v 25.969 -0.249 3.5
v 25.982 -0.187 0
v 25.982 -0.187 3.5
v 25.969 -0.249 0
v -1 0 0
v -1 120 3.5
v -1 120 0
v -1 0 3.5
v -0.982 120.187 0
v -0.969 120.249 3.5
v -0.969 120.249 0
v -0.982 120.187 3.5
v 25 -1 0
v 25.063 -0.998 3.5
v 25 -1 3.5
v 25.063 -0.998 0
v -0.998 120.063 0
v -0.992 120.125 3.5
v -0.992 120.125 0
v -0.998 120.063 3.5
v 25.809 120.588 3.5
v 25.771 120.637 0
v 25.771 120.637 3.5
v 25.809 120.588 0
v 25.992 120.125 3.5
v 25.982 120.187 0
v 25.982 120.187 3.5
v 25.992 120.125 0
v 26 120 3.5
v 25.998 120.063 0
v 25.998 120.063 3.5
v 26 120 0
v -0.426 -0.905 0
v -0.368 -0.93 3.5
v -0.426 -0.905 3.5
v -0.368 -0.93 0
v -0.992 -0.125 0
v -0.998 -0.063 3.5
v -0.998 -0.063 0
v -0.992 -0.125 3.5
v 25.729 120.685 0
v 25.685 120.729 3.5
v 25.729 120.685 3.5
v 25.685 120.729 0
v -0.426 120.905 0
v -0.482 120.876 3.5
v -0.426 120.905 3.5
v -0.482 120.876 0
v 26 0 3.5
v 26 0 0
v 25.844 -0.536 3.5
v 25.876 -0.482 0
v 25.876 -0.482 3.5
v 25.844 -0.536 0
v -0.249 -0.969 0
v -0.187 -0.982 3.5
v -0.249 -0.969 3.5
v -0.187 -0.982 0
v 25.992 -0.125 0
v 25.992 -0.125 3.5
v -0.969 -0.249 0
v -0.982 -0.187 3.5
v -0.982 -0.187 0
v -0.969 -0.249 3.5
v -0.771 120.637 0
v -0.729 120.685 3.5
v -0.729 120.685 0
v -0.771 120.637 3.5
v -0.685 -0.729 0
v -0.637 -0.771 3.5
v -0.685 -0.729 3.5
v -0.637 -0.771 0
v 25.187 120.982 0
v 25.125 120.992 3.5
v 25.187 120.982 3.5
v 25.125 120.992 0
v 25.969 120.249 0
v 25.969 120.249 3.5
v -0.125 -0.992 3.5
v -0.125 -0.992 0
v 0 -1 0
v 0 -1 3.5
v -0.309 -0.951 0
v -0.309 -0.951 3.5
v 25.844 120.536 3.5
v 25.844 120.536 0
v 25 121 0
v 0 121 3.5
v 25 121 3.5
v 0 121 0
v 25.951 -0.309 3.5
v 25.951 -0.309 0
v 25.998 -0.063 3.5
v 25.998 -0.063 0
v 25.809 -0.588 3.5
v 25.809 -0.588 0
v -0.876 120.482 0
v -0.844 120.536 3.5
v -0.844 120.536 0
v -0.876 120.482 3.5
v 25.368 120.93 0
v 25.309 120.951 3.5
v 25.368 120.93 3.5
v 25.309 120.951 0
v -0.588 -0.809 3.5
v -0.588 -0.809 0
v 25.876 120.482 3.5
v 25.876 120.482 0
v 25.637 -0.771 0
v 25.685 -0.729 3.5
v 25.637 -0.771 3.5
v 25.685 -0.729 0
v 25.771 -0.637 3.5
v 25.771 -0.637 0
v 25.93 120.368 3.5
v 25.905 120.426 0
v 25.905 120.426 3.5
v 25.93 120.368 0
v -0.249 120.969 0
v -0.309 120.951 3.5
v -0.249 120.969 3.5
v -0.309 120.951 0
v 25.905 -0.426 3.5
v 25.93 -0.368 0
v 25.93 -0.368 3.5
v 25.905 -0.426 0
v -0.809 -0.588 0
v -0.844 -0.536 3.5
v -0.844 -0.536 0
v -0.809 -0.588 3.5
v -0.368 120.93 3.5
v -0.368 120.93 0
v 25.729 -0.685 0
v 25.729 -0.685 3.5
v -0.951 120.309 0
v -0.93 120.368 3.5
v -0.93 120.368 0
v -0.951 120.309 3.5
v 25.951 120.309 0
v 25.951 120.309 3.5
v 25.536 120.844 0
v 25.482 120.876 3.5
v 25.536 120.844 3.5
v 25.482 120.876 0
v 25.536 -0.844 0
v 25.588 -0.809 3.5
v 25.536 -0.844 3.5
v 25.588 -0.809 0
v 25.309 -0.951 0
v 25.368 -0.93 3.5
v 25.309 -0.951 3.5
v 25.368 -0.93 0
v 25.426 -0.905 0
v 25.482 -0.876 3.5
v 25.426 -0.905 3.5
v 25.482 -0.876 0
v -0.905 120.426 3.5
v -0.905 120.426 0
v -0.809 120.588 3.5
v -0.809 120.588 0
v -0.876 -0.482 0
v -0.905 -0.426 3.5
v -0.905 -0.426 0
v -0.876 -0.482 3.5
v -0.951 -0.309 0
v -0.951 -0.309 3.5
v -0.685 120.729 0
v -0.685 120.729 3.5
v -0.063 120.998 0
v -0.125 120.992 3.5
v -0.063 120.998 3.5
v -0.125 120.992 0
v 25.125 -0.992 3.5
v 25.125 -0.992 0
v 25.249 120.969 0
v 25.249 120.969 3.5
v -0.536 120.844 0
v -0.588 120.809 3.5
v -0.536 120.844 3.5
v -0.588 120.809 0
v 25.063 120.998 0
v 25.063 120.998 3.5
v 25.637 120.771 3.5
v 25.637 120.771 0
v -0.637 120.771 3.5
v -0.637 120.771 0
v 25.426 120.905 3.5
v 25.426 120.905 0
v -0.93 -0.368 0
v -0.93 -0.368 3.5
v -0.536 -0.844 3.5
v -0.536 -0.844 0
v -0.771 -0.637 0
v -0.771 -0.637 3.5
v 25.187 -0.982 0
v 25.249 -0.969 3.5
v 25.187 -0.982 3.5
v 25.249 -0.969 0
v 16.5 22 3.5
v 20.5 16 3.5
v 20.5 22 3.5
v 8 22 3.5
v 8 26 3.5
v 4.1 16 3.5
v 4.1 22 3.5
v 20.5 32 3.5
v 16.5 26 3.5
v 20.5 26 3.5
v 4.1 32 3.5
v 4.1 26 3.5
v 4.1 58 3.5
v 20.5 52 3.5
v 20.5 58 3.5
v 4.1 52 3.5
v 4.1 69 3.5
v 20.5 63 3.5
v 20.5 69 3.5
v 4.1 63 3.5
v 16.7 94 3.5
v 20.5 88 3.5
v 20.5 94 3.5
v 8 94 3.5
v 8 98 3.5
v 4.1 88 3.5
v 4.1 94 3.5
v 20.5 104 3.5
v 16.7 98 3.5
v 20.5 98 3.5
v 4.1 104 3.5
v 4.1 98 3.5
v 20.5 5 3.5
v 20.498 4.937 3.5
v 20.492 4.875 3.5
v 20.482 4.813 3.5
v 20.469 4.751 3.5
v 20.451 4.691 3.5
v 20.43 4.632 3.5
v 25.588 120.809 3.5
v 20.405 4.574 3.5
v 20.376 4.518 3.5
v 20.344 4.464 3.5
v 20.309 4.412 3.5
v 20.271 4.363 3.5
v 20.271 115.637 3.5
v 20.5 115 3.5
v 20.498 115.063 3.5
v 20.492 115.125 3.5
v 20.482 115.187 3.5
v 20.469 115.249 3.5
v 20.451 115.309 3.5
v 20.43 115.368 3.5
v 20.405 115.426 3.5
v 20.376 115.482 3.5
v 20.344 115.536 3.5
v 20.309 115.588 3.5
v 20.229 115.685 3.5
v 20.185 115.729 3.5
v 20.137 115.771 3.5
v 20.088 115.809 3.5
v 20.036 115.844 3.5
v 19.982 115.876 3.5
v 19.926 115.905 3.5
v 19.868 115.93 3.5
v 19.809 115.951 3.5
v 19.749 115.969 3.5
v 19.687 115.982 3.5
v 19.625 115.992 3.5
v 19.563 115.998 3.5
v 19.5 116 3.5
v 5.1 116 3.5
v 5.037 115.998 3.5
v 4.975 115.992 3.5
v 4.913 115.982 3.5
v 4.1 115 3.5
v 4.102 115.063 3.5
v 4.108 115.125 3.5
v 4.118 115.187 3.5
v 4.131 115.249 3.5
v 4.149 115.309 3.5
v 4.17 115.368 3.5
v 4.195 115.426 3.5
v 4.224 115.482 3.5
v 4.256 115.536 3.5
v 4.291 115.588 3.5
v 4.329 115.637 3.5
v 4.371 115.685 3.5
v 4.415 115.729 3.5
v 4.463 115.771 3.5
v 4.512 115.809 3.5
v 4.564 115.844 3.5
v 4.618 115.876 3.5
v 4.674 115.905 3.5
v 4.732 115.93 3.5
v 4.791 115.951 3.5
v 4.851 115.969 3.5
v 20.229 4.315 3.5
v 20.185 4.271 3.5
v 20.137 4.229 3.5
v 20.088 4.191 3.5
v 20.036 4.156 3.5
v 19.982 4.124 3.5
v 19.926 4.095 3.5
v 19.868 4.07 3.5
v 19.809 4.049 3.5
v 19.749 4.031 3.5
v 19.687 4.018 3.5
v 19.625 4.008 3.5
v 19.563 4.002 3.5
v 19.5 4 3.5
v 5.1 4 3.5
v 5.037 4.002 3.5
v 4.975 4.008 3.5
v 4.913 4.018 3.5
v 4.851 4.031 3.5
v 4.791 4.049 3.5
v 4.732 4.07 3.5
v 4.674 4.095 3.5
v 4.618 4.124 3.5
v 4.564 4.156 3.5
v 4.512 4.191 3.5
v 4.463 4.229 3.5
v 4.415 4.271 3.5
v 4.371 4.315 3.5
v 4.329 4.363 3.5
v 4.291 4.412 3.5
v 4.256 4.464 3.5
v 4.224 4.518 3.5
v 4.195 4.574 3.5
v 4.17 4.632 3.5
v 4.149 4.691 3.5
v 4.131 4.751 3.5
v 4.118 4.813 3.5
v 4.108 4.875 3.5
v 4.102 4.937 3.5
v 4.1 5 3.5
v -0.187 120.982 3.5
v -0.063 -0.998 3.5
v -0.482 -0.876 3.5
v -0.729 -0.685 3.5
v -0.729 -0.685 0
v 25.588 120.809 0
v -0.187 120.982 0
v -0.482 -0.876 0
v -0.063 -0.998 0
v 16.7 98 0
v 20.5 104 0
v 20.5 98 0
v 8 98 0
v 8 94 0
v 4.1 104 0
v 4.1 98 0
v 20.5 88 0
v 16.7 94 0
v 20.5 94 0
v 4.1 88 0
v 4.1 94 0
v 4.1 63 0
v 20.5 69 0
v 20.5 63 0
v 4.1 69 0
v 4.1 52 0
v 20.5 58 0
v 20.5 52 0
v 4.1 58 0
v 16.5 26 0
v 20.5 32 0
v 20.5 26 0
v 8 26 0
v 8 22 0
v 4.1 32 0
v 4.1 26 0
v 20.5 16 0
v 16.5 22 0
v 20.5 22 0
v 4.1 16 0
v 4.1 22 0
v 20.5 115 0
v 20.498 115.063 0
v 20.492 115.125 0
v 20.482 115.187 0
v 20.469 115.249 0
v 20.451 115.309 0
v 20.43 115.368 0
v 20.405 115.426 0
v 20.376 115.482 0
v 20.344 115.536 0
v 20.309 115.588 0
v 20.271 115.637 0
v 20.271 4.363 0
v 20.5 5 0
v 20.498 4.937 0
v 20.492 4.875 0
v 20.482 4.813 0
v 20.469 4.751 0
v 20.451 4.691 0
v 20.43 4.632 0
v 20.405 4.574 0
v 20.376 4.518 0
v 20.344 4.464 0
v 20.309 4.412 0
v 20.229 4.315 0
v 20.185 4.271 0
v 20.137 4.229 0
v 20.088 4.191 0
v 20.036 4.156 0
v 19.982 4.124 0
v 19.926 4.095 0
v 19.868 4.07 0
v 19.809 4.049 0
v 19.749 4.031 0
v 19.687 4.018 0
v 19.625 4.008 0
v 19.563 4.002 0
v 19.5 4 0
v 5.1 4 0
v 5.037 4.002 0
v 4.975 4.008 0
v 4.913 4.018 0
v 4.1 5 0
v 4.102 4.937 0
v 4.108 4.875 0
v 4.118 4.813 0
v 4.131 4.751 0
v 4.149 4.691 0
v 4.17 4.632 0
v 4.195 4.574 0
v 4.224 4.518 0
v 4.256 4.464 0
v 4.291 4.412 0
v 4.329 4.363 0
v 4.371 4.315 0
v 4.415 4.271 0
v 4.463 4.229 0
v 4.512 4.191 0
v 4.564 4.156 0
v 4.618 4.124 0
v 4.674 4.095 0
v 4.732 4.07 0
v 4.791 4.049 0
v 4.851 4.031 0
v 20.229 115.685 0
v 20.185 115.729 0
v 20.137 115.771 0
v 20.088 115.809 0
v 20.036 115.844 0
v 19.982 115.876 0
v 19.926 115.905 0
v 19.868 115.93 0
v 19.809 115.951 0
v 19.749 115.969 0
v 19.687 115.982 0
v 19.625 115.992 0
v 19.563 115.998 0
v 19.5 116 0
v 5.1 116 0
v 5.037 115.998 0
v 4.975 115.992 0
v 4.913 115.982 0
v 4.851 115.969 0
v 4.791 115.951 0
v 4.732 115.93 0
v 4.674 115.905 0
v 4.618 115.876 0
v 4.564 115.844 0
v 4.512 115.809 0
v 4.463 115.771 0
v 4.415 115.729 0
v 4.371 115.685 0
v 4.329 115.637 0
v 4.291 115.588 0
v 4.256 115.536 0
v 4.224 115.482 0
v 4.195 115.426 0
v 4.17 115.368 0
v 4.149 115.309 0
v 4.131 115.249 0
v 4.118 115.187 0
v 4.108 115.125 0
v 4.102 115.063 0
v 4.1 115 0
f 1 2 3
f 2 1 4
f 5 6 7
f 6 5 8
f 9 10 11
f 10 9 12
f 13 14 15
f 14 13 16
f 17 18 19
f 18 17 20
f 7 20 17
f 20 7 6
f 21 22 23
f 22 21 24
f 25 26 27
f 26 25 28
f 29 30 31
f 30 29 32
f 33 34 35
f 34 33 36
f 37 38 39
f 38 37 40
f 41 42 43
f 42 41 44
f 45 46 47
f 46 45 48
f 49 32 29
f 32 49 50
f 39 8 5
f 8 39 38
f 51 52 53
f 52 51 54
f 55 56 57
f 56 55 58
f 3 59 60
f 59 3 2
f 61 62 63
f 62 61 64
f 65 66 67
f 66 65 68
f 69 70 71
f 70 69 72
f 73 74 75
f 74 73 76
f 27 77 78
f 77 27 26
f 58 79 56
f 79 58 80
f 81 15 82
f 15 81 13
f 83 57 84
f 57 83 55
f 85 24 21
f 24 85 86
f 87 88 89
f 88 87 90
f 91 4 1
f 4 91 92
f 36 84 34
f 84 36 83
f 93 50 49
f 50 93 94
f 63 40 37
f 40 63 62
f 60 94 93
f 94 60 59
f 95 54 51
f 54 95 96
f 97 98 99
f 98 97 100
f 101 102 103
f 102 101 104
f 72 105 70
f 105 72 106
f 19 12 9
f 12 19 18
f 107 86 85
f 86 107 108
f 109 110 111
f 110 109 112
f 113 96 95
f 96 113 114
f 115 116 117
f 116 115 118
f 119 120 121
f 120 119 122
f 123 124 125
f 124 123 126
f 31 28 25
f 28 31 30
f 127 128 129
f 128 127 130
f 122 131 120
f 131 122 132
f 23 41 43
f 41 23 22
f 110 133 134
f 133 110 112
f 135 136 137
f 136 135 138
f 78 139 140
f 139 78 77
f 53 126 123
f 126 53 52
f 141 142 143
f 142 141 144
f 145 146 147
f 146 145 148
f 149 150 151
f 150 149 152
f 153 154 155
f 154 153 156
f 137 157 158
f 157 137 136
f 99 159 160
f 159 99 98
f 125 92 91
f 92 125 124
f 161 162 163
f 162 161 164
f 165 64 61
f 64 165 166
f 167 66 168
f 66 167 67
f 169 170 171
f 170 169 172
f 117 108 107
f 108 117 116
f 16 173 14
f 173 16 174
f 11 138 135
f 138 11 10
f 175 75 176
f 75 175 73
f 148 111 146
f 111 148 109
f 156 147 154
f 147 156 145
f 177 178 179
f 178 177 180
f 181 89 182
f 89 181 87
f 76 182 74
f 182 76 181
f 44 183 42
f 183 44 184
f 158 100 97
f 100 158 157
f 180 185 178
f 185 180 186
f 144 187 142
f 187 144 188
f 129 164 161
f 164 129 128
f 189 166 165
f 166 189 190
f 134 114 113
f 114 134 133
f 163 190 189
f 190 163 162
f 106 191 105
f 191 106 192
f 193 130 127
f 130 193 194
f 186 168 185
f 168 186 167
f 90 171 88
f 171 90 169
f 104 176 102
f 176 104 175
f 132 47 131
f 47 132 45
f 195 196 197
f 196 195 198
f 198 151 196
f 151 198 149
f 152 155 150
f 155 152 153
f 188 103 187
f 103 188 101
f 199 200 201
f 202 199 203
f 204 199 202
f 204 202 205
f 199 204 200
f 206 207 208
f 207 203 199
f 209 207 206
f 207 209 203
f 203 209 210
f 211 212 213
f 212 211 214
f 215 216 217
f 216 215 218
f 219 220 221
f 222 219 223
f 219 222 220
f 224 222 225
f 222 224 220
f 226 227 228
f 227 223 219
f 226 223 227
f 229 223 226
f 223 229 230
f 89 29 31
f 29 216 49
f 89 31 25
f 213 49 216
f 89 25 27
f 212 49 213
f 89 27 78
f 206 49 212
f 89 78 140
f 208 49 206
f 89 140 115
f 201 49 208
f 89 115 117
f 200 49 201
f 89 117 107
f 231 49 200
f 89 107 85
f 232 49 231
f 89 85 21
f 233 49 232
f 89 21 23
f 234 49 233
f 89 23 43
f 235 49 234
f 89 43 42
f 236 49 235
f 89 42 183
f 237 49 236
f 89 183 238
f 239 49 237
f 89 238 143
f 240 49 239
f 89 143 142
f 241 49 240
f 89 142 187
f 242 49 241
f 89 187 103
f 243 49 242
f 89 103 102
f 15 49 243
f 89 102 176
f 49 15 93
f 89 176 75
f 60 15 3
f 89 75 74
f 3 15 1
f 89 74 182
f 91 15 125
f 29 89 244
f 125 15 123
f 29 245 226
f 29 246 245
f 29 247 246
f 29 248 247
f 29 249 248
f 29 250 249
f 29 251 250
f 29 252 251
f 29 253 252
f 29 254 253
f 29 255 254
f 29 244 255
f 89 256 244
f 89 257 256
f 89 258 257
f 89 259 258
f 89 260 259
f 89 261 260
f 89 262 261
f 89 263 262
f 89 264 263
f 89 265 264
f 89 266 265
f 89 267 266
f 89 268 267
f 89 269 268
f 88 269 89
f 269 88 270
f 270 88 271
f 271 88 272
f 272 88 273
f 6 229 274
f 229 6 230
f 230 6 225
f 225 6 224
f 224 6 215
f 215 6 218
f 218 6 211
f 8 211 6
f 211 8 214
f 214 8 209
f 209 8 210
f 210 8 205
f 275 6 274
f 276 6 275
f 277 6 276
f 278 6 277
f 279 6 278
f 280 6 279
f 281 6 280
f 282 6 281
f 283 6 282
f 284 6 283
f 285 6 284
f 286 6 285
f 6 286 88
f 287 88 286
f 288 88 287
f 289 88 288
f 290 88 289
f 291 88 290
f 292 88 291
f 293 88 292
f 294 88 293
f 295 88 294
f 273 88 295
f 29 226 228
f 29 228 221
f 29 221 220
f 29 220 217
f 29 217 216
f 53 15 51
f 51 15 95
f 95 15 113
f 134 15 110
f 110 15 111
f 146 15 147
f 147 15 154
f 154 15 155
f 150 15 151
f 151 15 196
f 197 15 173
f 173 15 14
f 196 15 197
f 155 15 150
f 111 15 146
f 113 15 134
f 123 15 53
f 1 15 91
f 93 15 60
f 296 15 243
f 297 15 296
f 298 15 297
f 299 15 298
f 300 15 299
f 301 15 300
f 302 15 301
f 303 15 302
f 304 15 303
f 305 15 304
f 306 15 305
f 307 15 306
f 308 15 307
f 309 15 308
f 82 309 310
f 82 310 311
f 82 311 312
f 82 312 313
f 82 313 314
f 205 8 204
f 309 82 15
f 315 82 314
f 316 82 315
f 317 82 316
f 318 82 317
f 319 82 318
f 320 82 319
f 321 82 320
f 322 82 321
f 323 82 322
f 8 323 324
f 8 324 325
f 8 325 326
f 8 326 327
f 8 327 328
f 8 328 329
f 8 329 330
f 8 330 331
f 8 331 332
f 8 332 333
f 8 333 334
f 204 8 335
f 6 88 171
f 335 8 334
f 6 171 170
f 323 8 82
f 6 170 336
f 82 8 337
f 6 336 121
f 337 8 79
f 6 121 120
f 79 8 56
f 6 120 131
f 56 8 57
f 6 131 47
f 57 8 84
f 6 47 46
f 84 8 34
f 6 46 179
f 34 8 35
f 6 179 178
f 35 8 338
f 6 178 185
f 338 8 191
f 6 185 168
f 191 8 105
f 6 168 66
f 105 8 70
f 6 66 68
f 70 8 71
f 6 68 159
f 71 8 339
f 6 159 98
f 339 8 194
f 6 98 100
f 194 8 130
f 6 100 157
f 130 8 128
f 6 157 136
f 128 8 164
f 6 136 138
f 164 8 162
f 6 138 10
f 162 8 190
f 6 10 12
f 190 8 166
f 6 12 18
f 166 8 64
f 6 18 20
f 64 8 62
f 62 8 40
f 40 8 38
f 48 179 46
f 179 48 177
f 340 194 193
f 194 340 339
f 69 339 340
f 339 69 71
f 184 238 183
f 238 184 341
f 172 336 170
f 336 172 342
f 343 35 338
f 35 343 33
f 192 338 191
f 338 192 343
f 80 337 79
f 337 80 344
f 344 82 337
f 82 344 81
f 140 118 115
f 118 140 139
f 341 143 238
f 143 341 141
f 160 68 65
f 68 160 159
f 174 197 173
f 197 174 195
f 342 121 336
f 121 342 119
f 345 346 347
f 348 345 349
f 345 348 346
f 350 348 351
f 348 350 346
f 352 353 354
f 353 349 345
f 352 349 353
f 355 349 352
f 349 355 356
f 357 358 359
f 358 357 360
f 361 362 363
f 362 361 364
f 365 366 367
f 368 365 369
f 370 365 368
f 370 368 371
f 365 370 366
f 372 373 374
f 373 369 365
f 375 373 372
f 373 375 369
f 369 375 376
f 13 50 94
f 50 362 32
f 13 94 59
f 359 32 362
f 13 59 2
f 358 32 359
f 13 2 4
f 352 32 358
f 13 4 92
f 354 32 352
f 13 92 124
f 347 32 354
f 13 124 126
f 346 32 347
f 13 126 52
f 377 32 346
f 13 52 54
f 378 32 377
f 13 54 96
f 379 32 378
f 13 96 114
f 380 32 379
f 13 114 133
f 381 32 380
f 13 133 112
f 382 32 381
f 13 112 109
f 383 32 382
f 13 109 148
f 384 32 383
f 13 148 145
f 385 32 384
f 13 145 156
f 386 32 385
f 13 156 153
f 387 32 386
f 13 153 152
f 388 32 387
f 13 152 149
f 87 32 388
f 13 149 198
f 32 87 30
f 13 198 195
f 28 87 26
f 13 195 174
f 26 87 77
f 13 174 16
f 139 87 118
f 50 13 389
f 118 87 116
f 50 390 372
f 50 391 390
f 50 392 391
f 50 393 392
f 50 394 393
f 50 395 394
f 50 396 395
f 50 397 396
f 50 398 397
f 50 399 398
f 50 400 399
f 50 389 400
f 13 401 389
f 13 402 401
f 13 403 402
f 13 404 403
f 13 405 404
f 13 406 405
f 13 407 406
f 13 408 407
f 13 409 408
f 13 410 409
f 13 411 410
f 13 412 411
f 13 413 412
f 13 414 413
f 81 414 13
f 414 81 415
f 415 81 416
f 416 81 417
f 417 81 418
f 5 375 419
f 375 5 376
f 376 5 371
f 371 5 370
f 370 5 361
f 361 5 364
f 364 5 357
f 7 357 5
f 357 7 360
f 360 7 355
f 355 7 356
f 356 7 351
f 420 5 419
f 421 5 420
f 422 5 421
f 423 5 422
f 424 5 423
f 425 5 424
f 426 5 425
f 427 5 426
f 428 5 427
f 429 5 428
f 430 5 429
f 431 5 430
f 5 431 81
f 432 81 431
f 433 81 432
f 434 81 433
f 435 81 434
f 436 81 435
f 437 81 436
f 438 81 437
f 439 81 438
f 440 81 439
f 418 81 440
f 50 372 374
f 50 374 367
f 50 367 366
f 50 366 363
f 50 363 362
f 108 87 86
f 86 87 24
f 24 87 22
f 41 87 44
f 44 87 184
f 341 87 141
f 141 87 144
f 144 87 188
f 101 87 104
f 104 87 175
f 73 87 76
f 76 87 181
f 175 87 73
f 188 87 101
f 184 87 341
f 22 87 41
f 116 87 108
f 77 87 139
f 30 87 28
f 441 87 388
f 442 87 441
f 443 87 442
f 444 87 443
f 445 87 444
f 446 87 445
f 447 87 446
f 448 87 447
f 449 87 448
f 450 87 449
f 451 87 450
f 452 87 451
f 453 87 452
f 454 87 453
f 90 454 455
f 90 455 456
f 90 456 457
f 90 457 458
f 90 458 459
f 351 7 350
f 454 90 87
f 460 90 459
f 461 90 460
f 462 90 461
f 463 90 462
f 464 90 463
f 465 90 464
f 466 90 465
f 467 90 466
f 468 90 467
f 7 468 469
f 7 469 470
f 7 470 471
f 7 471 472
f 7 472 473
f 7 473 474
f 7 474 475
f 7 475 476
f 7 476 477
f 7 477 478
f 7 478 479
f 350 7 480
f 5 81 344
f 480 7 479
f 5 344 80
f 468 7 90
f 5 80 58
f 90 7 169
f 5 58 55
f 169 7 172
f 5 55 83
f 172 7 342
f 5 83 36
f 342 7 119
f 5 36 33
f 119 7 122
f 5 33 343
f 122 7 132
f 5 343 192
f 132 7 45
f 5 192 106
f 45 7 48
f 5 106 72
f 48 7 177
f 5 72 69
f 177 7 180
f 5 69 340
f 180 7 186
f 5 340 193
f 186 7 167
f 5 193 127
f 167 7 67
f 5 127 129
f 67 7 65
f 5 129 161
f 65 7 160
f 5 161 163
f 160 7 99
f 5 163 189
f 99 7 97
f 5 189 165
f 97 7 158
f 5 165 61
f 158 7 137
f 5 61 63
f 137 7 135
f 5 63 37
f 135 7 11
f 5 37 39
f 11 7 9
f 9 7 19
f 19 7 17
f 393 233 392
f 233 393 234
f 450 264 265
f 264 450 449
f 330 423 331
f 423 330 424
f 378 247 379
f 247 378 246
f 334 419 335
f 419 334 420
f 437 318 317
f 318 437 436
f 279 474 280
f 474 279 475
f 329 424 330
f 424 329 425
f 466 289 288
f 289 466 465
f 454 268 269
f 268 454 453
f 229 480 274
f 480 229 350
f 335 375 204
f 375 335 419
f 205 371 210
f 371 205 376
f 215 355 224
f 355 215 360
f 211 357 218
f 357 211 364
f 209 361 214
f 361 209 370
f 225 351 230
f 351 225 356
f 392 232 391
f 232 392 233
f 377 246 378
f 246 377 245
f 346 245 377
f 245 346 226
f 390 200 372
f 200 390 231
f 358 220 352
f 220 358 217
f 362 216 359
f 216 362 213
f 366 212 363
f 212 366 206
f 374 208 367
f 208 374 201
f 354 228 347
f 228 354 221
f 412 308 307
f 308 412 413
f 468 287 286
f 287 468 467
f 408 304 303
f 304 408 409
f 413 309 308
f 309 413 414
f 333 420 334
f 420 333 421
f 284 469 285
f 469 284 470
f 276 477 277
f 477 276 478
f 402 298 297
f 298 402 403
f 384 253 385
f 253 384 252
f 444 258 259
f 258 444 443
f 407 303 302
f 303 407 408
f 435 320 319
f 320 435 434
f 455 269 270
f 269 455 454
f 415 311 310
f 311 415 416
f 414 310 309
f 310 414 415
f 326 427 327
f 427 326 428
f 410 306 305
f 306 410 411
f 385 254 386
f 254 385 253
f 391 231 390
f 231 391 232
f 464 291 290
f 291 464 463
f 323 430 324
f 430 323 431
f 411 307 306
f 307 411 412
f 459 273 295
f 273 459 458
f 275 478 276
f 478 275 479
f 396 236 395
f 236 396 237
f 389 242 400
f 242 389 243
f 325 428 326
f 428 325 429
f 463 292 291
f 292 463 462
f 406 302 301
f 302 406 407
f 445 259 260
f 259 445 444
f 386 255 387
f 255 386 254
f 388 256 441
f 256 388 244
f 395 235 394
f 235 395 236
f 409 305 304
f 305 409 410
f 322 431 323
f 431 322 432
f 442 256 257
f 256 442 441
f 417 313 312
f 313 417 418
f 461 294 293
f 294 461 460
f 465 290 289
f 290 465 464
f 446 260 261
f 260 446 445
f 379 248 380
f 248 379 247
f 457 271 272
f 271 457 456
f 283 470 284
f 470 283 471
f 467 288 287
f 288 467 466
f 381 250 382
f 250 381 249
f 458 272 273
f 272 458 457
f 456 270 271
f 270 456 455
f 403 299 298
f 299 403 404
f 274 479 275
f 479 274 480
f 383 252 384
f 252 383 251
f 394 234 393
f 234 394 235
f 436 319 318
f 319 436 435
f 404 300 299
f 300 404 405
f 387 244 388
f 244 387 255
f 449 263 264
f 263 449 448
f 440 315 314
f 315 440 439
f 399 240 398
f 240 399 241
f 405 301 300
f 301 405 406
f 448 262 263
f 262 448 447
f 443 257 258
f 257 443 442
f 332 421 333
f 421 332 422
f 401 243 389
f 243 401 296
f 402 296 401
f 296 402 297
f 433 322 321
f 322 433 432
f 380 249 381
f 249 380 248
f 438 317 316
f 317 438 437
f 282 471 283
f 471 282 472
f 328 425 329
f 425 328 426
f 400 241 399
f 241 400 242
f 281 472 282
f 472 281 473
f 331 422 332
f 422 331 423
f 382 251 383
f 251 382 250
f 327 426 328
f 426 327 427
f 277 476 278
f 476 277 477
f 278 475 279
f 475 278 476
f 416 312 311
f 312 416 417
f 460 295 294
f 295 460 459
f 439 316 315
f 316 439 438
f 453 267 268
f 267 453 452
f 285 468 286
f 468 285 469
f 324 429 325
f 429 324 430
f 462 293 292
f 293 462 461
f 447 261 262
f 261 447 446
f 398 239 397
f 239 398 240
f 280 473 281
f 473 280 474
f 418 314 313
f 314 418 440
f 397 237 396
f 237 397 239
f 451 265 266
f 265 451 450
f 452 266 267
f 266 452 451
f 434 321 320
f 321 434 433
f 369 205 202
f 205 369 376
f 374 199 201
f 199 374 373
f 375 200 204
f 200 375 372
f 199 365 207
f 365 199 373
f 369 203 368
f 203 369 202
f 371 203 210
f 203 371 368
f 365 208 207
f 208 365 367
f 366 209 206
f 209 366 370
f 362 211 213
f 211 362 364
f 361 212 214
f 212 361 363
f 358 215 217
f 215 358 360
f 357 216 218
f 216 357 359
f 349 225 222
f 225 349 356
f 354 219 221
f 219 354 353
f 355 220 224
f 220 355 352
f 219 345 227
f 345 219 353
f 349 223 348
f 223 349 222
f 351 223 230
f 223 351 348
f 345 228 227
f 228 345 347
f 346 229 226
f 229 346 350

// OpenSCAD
$fn = 100;

module riser() {
	difference() {
		minkowski() {
			cube([25,120,2.5]);
			cylinder(r=1,h=1);
		}
	
		translate([5.1,5,-1])
		minkowski() {
			cube([14.4,110,4]);
			cylinder(r=1,h=1);		
		}
	}

% translate([-2,60,0]) cube([34,1,10]);

	translate([-1,16,0]) cube([25,6,3.5]);
	translate([8,20,0]) cube([8.5,6,3.5]);
	translate([-1,26,0]) cube([25,6,3.5]);
	translate([-1,52,0]) cube([25,6,3.5]);
	//translate([-1,60,0]) cube([25,6,3.5]);
	translate([-1,63,0]) cube([25,6,3.5]);
	translate([-1,88,0]) cube([25,6,3.5]);
	translate([8,92,0]) cube([8.7,6,3.5]);
	translate([-1,98,0]) cube([25,6,3.5]);
}

module run() {
	difference() {
		union() {
			color("red") translate([-0.3,37,0]) cube([3.9,4,130]);
			color("red") translate([-0.3,35,3.5]) cube([3.9,8,2]);
			color("red") translate([-0.3,35,124.5]) cube([3.9,8,2]);
			color("red") translate([-0.1,38,80]) cube([13,2,2]);
		}
		color("red") translate([-0.2,38,48]) cube([1,2,2]);
	}
}

	riser();
	//translate([0,0,126.5]) riser();
	
	//translate([4.4,57,0]) run();
	//color("blue") rotate([180,0,180]) translate([-20.2,57,-130]) run();
	
